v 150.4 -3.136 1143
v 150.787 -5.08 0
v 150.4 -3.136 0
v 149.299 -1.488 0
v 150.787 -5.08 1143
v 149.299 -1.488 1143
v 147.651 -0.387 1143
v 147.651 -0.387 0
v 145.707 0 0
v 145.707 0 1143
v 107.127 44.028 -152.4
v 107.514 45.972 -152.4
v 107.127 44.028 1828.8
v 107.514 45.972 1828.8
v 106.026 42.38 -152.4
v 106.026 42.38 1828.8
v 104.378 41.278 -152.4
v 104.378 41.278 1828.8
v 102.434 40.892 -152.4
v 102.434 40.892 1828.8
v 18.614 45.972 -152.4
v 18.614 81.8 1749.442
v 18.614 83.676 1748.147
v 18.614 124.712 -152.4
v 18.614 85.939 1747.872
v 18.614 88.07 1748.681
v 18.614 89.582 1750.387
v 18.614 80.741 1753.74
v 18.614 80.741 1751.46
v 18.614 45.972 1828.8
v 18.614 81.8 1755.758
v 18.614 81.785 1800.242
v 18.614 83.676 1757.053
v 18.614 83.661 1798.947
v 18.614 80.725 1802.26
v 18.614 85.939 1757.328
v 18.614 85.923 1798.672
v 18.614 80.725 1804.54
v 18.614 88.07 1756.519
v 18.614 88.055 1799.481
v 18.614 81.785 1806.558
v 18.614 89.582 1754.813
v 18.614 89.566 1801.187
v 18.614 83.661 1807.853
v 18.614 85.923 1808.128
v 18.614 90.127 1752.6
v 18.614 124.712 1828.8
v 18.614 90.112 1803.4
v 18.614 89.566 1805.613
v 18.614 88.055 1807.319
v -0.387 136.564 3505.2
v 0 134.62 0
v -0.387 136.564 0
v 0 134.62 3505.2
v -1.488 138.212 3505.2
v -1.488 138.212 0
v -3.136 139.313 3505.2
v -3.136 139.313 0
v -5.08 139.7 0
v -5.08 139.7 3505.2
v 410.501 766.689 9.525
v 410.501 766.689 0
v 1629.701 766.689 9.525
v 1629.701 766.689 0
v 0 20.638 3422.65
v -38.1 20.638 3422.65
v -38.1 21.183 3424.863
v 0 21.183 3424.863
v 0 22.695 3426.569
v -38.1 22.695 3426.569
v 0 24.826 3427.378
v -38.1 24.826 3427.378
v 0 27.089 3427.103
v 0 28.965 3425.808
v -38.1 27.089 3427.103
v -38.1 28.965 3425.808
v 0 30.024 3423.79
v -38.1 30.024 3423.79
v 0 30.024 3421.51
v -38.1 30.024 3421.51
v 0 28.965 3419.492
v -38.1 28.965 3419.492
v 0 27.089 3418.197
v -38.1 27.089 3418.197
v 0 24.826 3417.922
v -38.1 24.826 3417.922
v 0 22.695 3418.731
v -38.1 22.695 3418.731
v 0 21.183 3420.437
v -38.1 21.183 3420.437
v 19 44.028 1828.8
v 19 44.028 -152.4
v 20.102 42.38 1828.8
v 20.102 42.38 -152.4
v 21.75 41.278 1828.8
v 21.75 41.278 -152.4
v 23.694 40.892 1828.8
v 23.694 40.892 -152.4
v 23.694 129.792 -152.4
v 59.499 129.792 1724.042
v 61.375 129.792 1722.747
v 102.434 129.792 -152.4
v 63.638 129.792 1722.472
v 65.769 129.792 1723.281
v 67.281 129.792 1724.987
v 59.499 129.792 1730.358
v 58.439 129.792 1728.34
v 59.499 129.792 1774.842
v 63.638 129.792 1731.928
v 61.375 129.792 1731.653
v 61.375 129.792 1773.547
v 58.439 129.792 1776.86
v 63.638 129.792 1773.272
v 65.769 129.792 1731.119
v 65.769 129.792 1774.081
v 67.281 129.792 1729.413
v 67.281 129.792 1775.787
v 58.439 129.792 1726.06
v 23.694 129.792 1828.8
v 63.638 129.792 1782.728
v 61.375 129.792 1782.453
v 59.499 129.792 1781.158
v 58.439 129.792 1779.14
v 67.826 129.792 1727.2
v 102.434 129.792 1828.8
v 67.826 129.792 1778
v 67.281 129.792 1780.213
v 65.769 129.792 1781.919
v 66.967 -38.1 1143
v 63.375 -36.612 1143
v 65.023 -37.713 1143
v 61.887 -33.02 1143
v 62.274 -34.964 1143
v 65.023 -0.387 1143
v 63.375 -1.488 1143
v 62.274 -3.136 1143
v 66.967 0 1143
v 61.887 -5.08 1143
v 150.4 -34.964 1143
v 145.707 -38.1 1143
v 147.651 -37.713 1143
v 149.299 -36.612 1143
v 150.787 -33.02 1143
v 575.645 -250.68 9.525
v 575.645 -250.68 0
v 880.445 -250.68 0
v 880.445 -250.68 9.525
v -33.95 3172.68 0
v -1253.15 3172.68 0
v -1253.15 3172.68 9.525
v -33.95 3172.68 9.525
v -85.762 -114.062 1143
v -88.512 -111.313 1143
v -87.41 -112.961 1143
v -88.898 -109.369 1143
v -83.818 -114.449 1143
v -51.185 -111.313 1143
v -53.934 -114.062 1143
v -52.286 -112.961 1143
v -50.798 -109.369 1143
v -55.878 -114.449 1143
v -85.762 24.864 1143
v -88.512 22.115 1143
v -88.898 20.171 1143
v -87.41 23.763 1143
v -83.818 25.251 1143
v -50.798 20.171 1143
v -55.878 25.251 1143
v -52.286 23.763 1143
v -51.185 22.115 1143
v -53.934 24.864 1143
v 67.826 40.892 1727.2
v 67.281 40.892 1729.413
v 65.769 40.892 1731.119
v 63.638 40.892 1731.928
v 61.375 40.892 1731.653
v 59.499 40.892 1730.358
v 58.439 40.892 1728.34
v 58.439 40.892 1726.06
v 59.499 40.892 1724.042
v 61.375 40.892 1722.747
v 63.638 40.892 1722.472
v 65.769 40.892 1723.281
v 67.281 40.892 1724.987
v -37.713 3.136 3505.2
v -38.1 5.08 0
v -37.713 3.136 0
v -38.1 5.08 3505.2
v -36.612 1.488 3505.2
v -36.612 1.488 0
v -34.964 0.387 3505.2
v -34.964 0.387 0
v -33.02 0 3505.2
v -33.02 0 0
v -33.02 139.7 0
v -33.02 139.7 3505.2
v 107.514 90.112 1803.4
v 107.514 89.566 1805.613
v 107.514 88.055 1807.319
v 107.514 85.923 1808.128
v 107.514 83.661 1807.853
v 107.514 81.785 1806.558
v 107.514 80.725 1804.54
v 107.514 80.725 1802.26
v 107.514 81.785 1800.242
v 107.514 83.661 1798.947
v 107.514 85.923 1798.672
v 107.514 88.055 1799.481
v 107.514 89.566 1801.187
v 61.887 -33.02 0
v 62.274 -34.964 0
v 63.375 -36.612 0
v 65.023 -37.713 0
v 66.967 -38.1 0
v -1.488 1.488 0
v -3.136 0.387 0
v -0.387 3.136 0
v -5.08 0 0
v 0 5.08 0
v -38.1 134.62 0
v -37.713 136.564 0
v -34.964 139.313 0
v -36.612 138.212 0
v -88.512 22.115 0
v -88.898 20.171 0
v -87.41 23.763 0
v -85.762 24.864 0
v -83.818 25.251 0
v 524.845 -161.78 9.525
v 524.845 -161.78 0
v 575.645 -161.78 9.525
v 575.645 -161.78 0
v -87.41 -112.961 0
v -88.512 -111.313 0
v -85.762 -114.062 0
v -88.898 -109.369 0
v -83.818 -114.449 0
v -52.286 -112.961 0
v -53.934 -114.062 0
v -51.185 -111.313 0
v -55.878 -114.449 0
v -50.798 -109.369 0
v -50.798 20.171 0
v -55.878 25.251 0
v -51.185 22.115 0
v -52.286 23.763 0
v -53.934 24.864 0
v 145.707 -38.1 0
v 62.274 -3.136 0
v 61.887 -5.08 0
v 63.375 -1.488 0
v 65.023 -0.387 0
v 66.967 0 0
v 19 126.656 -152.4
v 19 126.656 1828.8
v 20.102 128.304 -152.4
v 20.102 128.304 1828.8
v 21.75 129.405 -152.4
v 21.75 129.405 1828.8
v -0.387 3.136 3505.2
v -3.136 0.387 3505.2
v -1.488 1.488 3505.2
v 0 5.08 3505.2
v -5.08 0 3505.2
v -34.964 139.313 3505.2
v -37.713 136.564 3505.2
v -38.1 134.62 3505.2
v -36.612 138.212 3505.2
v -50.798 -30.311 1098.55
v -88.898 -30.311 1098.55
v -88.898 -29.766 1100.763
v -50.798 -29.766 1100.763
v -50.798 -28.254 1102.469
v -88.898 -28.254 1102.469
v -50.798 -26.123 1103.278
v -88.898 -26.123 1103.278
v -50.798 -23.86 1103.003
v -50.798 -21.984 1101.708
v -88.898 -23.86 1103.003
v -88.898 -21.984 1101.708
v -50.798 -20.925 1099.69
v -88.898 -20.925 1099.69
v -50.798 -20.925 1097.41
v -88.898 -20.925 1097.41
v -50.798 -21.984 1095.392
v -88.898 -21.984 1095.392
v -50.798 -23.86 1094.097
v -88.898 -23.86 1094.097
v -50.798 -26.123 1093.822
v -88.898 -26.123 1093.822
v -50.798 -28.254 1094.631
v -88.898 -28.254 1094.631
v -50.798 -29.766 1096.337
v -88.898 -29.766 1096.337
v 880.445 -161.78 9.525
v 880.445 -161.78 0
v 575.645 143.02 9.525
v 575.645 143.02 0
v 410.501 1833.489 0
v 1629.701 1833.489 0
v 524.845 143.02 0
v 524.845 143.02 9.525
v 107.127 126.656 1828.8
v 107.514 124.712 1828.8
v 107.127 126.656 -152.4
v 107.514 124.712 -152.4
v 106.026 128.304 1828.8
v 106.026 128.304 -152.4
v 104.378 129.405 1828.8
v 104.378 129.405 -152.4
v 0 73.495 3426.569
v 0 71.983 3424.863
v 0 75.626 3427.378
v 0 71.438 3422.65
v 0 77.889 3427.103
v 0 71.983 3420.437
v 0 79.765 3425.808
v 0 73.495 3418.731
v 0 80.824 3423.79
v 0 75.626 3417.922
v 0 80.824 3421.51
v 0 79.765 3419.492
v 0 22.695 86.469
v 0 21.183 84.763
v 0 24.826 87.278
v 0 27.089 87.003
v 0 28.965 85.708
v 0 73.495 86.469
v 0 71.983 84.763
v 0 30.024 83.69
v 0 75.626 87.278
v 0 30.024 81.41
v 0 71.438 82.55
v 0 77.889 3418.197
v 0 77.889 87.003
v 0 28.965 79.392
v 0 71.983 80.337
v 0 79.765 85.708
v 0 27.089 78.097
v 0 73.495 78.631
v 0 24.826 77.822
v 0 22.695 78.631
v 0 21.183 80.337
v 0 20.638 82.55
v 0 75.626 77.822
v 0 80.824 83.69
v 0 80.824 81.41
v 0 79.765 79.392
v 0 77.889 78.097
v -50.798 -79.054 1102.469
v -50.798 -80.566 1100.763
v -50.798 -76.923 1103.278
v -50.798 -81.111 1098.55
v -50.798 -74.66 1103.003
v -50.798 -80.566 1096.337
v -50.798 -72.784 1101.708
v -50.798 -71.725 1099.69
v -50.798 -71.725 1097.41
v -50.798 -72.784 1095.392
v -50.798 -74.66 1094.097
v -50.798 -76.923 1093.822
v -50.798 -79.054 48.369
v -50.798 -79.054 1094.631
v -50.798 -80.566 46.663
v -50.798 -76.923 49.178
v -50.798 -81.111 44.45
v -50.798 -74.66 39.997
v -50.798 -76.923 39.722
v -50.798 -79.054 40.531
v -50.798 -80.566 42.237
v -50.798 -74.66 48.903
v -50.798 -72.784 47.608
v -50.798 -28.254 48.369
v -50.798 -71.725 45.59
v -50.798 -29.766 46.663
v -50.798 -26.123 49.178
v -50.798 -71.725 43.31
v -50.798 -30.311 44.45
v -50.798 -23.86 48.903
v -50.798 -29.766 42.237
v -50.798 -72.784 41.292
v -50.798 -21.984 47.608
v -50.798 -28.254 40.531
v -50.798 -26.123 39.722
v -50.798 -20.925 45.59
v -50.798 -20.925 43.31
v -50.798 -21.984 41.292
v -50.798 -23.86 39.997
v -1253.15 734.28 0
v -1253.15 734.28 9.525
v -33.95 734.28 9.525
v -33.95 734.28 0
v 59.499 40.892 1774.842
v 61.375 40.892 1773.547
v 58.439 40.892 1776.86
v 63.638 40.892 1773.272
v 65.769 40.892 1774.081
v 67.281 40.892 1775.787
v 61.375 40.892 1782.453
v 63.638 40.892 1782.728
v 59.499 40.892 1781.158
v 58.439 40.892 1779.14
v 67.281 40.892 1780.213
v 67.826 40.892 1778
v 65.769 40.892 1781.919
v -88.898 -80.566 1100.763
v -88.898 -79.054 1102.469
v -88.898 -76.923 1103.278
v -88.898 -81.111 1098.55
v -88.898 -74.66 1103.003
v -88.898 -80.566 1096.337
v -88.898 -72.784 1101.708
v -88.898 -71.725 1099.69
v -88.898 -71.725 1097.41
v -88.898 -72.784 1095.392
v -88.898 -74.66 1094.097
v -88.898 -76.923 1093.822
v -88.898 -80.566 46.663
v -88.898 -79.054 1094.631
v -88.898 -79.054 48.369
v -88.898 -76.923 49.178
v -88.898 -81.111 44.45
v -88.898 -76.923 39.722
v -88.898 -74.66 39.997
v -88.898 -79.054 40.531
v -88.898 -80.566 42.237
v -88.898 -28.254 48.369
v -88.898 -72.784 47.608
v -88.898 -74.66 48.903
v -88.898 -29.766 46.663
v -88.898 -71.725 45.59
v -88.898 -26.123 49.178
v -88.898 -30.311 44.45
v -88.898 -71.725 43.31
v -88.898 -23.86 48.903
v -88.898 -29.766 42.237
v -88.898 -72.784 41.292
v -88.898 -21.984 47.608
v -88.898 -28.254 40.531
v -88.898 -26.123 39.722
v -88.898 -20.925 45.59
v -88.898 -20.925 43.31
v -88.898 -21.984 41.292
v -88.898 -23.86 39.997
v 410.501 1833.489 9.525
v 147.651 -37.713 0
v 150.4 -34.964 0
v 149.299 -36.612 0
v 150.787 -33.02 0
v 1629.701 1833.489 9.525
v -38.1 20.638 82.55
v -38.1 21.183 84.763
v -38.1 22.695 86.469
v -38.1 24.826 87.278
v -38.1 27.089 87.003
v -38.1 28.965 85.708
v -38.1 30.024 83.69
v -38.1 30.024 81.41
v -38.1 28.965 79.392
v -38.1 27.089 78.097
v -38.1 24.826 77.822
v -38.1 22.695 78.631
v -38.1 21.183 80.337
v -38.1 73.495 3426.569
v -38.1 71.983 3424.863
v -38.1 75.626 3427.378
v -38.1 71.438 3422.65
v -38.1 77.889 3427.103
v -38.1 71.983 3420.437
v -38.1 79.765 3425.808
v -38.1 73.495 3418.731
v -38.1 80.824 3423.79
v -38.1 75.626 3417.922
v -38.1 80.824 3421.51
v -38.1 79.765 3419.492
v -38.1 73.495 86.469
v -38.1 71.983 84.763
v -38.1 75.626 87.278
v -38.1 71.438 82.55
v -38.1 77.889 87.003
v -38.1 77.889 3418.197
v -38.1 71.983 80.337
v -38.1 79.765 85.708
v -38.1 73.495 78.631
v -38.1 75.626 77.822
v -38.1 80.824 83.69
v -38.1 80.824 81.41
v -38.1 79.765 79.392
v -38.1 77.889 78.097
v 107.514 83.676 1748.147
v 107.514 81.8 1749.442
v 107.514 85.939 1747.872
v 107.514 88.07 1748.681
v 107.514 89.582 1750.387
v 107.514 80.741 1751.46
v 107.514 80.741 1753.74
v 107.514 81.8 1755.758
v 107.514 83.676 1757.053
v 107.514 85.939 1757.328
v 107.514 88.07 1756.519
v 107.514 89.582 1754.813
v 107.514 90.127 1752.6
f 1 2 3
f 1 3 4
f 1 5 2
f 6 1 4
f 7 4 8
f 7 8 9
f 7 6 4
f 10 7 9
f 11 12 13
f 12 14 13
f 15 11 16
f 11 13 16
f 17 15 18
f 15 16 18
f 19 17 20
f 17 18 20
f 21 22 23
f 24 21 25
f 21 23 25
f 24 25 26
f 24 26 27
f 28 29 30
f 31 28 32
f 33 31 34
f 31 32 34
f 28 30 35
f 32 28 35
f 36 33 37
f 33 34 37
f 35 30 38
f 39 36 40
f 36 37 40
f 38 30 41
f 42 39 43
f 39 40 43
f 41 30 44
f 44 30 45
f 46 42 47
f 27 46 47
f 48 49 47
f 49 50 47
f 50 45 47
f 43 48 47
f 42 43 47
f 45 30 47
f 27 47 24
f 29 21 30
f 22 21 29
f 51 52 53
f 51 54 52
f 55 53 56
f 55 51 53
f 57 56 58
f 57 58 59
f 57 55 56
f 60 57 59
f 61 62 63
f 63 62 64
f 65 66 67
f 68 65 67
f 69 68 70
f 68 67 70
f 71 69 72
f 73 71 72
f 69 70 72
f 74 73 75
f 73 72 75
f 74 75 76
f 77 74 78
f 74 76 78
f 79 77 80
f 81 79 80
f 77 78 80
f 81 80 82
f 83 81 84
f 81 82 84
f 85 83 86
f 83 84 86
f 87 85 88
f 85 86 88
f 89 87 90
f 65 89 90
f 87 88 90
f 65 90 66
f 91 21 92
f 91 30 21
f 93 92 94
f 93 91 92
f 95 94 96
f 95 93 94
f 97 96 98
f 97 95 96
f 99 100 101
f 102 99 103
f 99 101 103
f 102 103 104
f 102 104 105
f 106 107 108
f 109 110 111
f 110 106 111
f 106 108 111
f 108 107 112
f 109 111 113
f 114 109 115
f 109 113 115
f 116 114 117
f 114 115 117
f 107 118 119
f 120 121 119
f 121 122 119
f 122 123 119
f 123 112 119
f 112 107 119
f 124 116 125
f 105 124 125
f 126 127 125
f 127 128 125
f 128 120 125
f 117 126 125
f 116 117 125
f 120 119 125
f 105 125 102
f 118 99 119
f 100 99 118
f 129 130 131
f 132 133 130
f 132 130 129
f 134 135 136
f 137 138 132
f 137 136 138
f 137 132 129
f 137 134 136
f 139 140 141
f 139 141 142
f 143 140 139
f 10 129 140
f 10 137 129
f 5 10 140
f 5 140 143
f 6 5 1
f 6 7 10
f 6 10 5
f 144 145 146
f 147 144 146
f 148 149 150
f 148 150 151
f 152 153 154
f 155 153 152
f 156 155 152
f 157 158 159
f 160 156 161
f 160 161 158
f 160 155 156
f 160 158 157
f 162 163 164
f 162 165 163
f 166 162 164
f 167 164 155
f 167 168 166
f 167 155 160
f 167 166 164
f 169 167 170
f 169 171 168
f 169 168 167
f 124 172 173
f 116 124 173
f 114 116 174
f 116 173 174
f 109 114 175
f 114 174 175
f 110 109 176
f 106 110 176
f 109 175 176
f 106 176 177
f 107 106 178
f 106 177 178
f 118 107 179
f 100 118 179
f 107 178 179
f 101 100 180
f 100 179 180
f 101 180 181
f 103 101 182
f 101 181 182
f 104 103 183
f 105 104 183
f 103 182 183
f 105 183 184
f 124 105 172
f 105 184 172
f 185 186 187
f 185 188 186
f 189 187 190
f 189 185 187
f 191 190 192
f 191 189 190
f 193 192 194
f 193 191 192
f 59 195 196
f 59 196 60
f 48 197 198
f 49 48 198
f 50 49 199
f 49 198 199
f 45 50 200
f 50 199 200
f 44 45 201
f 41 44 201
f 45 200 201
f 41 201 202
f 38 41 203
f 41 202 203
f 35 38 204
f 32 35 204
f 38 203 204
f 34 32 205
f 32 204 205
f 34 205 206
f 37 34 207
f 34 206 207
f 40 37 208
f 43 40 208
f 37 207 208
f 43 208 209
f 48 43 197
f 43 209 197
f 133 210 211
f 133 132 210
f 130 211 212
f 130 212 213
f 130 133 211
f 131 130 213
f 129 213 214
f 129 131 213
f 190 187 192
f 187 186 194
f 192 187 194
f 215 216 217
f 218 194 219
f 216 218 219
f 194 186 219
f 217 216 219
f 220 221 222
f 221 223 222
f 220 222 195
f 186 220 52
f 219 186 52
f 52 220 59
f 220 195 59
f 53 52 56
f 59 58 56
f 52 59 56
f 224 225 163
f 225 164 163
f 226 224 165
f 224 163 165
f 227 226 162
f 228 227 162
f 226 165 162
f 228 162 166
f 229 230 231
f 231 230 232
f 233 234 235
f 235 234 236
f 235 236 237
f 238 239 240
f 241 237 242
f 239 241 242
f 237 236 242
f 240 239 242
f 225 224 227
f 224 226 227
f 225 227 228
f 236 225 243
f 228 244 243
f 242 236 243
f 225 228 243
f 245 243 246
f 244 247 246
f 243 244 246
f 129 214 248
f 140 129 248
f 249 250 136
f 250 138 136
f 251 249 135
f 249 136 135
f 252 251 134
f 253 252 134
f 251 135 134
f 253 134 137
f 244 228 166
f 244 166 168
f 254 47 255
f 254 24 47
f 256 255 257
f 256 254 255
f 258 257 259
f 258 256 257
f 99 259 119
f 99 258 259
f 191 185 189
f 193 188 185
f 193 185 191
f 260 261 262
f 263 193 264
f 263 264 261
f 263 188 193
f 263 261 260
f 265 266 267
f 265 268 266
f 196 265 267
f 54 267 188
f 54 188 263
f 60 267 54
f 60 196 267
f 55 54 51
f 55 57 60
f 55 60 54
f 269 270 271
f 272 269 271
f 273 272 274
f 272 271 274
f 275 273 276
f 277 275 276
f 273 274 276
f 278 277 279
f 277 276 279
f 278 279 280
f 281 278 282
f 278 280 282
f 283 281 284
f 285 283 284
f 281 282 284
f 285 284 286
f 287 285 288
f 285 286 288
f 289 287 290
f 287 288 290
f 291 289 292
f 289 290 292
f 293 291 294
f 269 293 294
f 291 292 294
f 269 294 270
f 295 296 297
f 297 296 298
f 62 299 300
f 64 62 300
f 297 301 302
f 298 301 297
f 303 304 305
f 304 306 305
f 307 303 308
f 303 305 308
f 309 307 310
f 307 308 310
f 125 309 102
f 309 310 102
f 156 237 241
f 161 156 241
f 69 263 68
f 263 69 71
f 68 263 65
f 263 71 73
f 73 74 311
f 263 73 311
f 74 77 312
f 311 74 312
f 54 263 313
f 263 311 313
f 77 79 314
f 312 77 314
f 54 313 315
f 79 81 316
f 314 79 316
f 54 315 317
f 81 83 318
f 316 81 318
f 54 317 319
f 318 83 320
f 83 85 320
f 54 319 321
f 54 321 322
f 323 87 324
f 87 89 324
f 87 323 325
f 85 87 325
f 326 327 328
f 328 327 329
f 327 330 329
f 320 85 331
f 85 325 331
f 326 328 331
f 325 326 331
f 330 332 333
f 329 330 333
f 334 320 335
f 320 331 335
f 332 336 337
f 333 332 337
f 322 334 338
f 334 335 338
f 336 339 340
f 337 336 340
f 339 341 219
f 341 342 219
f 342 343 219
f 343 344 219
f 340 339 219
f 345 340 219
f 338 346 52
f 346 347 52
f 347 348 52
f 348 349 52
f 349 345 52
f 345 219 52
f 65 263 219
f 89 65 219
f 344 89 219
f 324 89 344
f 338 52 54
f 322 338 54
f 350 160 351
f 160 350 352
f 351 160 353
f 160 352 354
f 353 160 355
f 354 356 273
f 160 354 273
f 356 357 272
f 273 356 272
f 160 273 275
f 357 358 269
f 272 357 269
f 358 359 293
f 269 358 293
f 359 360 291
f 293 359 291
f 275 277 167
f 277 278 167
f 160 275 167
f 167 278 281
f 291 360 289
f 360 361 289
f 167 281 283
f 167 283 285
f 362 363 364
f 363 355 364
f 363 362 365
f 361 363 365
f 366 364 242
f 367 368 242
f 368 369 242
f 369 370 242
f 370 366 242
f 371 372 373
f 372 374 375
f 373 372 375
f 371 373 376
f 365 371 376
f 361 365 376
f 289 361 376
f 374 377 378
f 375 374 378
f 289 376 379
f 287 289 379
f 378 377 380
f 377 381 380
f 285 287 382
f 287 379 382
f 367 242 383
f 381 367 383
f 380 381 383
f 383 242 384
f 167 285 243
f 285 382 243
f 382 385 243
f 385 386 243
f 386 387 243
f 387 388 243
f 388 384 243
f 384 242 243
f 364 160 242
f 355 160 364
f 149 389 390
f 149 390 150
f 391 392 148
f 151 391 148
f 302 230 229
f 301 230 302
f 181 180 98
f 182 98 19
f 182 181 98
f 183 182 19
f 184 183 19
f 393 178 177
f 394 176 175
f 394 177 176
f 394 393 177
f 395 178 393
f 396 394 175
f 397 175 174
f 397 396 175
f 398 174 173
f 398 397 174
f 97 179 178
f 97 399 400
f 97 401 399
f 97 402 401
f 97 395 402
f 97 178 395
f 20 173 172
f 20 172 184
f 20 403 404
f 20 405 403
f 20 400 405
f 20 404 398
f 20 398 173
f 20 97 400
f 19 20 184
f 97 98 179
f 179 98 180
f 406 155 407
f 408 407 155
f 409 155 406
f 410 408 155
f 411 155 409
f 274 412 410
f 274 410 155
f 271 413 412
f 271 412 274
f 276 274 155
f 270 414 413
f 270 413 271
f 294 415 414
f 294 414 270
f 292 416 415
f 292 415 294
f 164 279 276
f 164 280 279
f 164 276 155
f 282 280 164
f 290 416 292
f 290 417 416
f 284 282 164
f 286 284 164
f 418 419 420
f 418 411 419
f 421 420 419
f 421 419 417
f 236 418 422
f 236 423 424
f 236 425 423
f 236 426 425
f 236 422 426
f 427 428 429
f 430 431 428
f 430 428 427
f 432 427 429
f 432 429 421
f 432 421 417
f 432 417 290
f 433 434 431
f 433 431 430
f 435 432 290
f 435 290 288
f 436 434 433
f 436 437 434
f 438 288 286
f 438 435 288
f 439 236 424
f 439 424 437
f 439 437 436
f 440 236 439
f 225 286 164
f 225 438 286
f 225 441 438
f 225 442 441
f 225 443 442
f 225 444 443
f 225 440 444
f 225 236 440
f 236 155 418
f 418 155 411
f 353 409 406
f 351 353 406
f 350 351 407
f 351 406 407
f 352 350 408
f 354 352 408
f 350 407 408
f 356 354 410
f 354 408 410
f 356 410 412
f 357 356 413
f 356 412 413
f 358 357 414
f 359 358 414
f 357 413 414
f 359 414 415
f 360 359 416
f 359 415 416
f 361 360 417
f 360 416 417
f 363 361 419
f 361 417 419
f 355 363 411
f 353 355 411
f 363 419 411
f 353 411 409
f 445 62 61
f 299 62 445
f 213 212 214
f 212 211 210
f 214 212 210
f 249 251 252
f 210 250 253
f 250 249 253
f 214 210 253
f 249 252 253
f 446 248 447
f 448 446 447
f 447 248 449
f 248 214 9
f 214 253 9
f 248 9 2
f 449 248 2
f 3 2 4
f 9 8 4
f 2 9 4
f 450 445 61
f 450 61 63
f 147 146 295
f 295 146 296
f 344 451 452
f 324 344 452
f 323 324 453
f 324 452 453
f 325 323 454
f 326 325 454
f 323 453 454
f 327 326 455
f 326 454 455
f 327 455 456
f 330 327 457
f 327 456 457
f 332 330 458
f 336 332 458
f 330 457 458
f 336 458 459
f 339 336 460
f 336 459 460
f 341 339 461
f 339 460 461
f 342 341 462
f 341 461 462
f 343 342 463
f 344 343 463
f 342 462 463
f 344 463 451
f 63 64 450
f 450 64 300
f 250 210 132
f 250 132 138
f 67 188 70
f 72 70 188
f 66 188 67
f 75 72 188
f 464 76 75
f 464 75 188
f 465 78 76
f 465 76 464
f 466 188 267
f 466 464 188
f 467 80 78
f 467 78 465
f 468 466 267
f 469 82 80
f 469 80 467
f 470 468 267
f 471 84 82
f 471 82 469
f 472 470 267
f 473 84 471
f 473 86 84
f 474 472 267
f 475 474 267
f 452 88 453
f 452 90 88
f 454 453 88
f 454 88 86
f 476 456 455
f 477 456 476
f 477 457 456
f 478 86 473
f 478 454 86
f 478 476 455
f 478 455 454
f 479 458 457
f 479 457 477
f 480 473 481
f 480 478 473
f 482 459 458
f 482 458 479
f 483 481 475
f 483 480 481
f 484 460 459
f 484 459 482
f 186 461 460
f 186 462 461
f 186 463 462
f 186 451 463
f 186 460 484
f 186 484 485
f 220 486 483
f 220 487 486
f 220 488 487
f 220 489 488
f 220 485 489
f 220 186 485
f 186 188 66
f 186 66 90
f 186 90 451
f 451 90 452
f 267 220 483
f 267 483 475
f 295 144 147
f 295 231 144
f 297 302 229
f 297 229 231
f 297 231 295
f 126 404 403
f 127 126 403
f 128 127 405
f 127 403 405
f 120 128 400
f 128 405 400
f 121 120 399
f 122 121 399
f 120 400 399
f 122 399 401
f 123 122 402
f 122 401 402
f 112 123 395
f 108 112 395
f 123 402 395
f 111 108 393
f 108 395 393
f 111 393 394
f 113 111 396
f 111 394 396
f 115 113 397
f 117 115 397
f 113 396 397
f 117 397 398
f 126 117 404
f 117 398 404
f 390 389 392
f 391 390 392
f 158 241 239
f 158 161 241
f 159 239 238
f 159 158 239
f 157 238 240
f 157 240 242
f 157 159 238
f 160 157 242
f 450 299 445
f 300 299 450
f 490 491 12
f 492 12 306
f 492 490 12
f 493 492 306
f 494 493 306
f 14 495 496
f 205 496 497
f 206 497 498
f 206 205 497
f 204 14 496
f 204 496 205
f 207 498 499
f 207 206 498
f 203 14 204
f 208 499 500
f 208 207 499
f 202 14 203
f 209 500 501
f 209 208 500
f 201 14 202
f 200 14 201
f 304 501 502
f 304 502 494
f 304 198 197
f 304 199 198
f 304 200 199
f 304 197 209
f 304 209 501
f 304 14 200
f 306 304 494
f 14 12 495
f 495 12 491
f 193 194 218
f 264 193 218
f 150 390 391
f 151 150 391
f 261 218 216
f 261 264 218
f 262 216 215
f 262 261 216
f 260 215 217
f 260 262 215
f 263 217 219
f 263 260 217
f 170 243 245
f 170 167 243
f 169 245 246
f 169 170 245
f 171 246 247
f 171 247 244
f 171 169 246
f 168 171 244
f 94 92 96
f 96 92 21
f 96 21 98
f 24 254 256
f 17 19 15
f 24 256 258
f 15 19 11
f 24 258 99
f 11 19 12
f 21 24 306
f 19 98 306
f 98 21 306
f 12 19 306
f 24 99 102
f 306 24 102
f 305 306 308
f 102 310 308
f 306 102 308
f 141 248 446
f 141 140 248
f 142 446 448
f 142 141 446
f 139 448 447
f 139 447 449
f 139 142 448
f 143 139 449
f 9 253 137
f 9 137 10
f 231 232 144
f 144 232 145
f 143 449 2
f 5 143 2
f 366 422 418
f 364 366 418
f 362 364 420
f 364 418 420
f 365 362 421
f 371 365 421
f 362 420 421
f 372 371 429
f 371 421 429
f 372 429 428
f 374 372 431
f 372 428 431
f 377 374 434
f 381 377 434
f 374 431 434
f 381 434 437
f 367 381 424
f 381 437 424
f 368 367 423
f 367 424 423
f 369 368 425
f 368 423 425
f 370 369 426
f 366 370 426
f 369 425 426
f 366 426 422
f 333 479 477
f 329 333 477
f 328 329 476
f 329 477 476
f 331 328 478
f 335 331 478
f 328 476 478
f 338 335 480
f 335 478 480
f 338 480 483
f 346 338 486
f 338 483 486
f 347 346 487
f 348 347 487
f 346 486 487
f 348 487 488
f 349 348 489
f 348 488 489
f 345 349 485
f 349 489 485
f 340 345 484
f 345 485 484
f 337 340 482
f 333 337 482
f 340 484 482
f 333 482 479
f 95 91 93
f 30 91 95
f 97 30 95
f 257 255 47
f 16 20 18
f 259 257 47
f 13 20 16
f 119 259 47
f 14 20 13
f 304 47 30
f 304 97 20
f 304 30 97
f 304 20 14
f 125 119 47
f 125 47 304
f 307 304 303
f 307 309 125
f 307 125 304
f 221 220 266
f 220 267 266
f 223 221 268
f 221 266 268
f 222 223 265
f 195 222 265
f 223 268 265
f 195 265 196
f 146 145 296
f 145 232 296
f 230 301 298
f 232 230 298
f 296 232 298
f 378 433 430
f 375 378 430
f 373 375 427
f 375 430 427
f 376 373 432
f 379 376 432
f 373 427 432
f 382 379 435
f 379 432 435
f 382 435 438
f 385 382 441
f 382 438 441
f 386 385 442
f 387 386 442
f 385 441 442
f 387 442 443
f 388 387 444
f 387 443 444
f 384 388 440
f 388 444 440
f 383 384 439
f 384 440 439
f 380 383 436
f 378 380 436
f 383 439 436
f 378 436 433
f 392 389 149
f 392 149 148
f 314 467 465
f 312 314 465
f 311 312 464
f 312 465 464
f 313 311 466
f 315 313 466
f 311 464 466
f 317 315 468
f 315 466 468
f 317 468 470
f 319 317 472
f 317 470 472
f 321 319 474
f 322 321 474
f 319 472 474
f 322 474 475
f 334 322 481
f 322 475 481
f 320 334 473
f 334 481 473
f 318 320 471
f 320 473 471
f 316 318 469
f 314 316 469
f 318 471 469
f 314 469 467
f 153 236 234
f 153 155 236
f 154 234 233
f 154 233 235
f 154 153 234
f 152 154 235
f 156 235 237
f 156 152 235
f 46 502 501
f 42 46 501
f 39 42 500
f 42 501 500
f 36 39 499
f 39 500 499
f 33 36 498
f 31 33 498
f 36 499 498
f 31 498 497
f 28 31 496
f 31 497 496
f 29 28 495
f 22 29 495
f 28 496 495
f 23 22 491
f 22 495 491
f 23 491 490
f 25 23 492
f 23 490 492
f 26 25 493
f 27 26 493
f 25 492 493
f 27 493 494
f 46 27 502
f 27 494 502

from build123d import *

# Parameters (mm, degrees)
F0_W          = 88.9
F0_H          = 38.1
F1_DEPTH      = 1143
F2_R          = 5.08
F3_W          = 88.9
F3_H          = 88.9
F4_DEPTH      = 1828.8
F4_DEPTH_BACK = 152.4
F5_R          = 5.08
F6_W          = 38.1
F6_H          = 139.7
F7_DEPTH      = 3505.2
F8_R          = 5.08
F9_W          = 38.1
F9_H          = 139.7
F10_DEPTH     = 1143
F11_R         = 5.08
F12_W         = 1219.2
F12_H         = 2438.4
F13_DEPTH     = 9.525
F14_W         = 1219.2
F14_H         = 1066.8
F15_DEPTH     = 9.525
F16_R         = 4.7625
F17_DEPTH     = 88.9
F18_R         = 4.7625
F19_DEPTH     = 88.9
F20_R         = 4.7625
F21_DEPTH     = 38.1
F22_R         = 4.7625
F23_DEPTH     = 38.1
F24_W         = 304.8
F24_H         = 88.9
F24_W_2       = 50.8
F24_H_2       = 304.8
F25_DEPTH     = 9.525


with BuildPart() as f1:
    # F0 (on Top) → F1 (new body)
    with BuildSketch(Plane.XY):
        with Locations((106.336877, -19.05)):
            Rectangle(F0_W, F0_H)
    extrude(amount=F1_DEPTH)

    # F2
    f2_edges = [f1.edges().sort_by_distance(p)[0] for p in [
        (150.786877, -38.1, 571.5),
        (61.886877, -38.1, 571.5),
        (150.786877, 0, 571.5),
        (61.886877, 0, 571.5),
    ]]
    fillet(f2_edges, radius=F2_R)


with BuildPart() as f4:
    # F3 (on Top) → F4 (new body, two sides)
    with BuildSketch(Plane.XY) as f4_sk:
        with Locations((63.063603, 85.341635)):
            Rectangle(F3_W, F3_H)
    extrude(amount=F4_DEPTH)
    extrude(f4_sk.sketch, amount=-F4_DEPTH_BACK)

    # F5
    f5_edges = [f4.edges().sort_by_distance(p)[0] for p in [
        (107.513603, 129.791635, 838.2),
        (18.613603, 129.791635, 838.2),
        (107.513603, 40.891635, 838.2),
        (18.613603, 40.891635, 838.2),
    ]]
    fillet(f5_edges, radius=F5_R)

    # F16 (on face) → F17 (cut, through all)
    with BuildSketch(Plane.YZ.offset(107.513603)):
        with Locations((85.349394, 1803.4)):
            Circle(F16_R)
        with Locations((85.364911, 1752.6)):
            Circle(F16_R)
    extrude(amount=-F17_DEPTH, mode=Mode.SUBTRACT)

    # F18 (on face) → F19 (cut, through all)
    with BuildSketch(Plane.XZ.offset(-40.891635)):
        with Locations((63.063603, 1778)):
            Circle(F18_R)
        with Locations((63.063603, 1727.2)):
            Circle(F18_R)
    extrude(amount=-F19_DEPTH, mode=Mode.SUBTRACT)


with BuildPart() as f7:
    # F6 (on Top) → F7 (new body)
    with BuildSketch(Plane.XY):
        with Locations((-19.05, 69.85)):
            Rectangle(F6_W, F6_H)
    extrude(amount=F7_DEPTH)

    # F8
    f8_edges = [f7.edges().sort_by_distance(p)[0] for p in [
        (-38.1, 0, 1752.6),
        (0, 0, 1752.6),
        (0, 139.7, 1752.6),
        (-38.1, 139.7, 1752.6),
    ]]
    fillet(f8_edges, radius=F8_R)

    # F22 (on face) → F23 (cut, through all)
    with BuildSketch(Plane(origin=(-38.1, 0, 0), x_dir=(0, -1, 0), z_dir=(-1, 0, 0))):
        with Locations((-76.2, 82.55)):
            Circle(F22_R)
        with Locations((-25.4, 82.55)):
            Circle(F22_R)
        with Locations((-25.4, 3422.65)):
            Circle(F22_R)
        with Locations((-76.2, 3422.65)):
            Circle(F22_R)
    extrude(amount=-F23_DEPTH, mode=Mode.SUBTRACT)


with BuildPart() as f10:
    # F9 (on Top) → F10 (new body)
    with BuildSketch(Plane.XY):
        with Locations((-69.848322, -44.598838)):
            Rectangle(F9_W, F9_H)
    extrude(amount=F10_DEPTH)

    # F11
    f11_edges = [f10.edges().sort_by_distance(p)[0] for p in [
        (-88.898322, -114.448838, 571.5),
        (-50.798322, -114.448838, 571.5),
        (-88.898322, 25.251162, 571.5),
        (-50.798322, 25.251162, 571.5),
    ]]
    fillet(f11_edges, radius=F11_R)

    # F20 (on face) → F21 (cut, through all)
    with BuildSketch(Plane(origin=(-88.898322, 0, 0), x_dir=(0, -1, 0), z_dir=(-1, 0, 0))):
        with Locations((25.548838, 1098.55)):
            Circle(F20_R)
        with Locations((76.348838, 1098.55)):
            Circle(F20_R)
        with Locations((25.548838, 44.45)):
            Circle(F20_R)
        with Locations((76.348838, 44.45)):
            Circle(F20_R)
    extrude(amount=-F21_DEPTH, mode=Mode.SUBTRACT)


with BuildPart() as f13:
    # F12 (on Top) → F13 (new body)
    with BuildSketch(Plane.XY):
        with Locations((-643.550232, 1953.480078)):
            Rectangle(F12_W, F12_H)
    extrude(amount=F13_DEPTH)


with BuildPart() as f15:
    # F14 (on Top) → F15 (new body)
    with BuildSketch(Plane.XY):
        with Locations((1020.100817, 1300.089112)):
            Rectangle(F14_W, F14_H)
    extrude(amount=F15_DEPTH)


with BuildPart() as f25:
    # F24 (on Top) → F25 (new body)
    with BuildSketch(Plane.XY):
        with Locations((728.045387, -206.229576)):
            Rectangle(F24_W, F24_H)
        Polygon((880.445387, -161.779576), (575.645387, 143.020424), (575.645387, -161.779576), align=None)
        with Locations((550.245387, -9.379576)):
            Rectangle(F24_W_2, F24_H_2)
    extrude(amount=F25_DEPTH)


solid = Compound([f1.part, f4.part, f7.part, f10.part, f13.part, f15.part, f25.part])
